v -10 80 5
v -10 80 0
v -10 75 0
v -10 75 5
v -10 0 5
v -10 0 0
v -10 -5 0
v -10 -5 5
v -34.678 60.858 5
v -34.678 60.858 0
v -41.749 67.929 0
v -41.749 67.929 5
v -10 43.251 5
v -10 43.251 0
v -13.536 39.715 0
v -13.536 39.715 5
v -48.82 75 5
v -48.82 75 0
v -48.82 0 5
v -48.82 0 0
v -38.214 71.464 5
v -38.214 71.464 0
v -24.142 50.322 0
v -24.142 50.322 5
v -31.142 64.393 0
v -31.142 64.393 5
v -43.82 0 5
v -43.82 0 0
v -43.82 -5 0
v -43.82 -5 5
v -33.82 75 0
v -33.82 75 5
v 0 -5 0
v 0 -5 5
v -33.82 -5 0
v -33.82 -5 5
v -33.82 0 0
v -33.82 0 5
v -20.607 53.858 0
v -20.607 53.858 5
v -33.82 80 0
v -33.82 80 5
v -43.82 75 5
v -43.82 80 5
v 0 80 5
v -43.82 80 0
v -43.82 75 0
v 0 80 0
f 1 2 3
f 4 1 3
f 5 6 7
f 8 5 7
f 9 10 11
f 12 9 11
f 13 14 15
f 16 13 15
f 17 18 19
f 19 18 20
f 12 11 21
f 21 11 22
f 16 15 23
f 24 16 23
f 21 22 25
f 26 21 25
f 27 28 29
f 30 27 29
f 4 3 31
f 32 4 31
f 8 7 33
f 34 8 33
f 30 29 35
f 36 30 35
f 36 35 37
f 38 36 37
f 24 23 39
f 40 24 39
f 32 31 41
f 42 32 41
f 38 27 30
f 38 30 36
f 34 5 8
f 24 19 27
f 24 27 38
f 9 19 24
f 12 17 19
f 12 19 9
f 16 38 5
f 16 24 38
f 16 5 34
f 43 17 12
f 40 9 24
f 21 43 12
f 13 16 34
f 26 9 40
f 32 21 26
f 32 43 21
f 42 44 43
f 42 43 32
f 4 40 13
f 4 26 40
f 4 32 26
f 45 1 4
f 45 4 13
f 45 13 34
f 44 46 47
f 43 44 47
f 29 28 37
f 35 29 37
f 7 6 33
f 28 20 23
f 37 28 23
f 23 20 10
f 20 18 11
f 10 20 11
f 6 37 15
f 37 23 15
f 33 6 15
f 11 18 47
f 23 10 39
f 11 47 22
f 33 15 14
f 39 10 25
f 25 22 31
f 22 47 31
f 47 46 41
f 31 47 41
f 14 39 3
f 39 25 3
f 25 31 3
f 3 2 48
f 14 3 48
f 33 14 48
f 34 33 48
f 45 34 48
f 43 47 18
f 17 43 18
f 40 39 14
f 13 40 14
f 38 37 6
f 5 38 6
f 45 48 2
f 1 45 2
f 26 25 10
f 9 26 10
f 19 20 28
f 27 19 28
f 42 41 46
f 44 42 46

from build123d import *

# Parameters (mm, degrees)
BOSS_EXTRU_1_DEPTH = 5


with BuildPart() as part:
    # Esquisse1 → Boss.-Extru.1 (new body)
    with BuildSketch(Plane.XY):
        Polygon((-41.749094475, 67.928932188), (-48.820162287, 75), (-48.820162287, 0), (-43.820162287, 0), (-43.820162287, -5), (-33.820162287, -5), (-33.820162287, 0), (-10, 0), (-10, -5), (0, -5), (0, 0), (0, 26.179837713), (-13.535533906, 39.715371619), (-24.142135624, 50.321973337), (-34.678026663, 60.857864376), align=None)
        Polygon((-43.820162287, 75), (-48.820162287, 75), (-41.749094475, 67.928932188), (-38.213560569, 71.464466094), (-31.142492757, 64.393398282), (-34.678026663, 60.857864376), (-24.142135624, 50.321973337), (-20.606601718, 53.857507243), (-10, 43.250905525), (-13.535533906, 39.715371619), (0, 26.179837713), (0, 75), (0, 80), (-10, 80), (-10, 75), (-33.820162287, 75), (-33.820162287, 80), (-43.820162287, 80), align=None)
    extrude(amount=BOSS_EXTRU_1_DEPTH)


solid = part.part
